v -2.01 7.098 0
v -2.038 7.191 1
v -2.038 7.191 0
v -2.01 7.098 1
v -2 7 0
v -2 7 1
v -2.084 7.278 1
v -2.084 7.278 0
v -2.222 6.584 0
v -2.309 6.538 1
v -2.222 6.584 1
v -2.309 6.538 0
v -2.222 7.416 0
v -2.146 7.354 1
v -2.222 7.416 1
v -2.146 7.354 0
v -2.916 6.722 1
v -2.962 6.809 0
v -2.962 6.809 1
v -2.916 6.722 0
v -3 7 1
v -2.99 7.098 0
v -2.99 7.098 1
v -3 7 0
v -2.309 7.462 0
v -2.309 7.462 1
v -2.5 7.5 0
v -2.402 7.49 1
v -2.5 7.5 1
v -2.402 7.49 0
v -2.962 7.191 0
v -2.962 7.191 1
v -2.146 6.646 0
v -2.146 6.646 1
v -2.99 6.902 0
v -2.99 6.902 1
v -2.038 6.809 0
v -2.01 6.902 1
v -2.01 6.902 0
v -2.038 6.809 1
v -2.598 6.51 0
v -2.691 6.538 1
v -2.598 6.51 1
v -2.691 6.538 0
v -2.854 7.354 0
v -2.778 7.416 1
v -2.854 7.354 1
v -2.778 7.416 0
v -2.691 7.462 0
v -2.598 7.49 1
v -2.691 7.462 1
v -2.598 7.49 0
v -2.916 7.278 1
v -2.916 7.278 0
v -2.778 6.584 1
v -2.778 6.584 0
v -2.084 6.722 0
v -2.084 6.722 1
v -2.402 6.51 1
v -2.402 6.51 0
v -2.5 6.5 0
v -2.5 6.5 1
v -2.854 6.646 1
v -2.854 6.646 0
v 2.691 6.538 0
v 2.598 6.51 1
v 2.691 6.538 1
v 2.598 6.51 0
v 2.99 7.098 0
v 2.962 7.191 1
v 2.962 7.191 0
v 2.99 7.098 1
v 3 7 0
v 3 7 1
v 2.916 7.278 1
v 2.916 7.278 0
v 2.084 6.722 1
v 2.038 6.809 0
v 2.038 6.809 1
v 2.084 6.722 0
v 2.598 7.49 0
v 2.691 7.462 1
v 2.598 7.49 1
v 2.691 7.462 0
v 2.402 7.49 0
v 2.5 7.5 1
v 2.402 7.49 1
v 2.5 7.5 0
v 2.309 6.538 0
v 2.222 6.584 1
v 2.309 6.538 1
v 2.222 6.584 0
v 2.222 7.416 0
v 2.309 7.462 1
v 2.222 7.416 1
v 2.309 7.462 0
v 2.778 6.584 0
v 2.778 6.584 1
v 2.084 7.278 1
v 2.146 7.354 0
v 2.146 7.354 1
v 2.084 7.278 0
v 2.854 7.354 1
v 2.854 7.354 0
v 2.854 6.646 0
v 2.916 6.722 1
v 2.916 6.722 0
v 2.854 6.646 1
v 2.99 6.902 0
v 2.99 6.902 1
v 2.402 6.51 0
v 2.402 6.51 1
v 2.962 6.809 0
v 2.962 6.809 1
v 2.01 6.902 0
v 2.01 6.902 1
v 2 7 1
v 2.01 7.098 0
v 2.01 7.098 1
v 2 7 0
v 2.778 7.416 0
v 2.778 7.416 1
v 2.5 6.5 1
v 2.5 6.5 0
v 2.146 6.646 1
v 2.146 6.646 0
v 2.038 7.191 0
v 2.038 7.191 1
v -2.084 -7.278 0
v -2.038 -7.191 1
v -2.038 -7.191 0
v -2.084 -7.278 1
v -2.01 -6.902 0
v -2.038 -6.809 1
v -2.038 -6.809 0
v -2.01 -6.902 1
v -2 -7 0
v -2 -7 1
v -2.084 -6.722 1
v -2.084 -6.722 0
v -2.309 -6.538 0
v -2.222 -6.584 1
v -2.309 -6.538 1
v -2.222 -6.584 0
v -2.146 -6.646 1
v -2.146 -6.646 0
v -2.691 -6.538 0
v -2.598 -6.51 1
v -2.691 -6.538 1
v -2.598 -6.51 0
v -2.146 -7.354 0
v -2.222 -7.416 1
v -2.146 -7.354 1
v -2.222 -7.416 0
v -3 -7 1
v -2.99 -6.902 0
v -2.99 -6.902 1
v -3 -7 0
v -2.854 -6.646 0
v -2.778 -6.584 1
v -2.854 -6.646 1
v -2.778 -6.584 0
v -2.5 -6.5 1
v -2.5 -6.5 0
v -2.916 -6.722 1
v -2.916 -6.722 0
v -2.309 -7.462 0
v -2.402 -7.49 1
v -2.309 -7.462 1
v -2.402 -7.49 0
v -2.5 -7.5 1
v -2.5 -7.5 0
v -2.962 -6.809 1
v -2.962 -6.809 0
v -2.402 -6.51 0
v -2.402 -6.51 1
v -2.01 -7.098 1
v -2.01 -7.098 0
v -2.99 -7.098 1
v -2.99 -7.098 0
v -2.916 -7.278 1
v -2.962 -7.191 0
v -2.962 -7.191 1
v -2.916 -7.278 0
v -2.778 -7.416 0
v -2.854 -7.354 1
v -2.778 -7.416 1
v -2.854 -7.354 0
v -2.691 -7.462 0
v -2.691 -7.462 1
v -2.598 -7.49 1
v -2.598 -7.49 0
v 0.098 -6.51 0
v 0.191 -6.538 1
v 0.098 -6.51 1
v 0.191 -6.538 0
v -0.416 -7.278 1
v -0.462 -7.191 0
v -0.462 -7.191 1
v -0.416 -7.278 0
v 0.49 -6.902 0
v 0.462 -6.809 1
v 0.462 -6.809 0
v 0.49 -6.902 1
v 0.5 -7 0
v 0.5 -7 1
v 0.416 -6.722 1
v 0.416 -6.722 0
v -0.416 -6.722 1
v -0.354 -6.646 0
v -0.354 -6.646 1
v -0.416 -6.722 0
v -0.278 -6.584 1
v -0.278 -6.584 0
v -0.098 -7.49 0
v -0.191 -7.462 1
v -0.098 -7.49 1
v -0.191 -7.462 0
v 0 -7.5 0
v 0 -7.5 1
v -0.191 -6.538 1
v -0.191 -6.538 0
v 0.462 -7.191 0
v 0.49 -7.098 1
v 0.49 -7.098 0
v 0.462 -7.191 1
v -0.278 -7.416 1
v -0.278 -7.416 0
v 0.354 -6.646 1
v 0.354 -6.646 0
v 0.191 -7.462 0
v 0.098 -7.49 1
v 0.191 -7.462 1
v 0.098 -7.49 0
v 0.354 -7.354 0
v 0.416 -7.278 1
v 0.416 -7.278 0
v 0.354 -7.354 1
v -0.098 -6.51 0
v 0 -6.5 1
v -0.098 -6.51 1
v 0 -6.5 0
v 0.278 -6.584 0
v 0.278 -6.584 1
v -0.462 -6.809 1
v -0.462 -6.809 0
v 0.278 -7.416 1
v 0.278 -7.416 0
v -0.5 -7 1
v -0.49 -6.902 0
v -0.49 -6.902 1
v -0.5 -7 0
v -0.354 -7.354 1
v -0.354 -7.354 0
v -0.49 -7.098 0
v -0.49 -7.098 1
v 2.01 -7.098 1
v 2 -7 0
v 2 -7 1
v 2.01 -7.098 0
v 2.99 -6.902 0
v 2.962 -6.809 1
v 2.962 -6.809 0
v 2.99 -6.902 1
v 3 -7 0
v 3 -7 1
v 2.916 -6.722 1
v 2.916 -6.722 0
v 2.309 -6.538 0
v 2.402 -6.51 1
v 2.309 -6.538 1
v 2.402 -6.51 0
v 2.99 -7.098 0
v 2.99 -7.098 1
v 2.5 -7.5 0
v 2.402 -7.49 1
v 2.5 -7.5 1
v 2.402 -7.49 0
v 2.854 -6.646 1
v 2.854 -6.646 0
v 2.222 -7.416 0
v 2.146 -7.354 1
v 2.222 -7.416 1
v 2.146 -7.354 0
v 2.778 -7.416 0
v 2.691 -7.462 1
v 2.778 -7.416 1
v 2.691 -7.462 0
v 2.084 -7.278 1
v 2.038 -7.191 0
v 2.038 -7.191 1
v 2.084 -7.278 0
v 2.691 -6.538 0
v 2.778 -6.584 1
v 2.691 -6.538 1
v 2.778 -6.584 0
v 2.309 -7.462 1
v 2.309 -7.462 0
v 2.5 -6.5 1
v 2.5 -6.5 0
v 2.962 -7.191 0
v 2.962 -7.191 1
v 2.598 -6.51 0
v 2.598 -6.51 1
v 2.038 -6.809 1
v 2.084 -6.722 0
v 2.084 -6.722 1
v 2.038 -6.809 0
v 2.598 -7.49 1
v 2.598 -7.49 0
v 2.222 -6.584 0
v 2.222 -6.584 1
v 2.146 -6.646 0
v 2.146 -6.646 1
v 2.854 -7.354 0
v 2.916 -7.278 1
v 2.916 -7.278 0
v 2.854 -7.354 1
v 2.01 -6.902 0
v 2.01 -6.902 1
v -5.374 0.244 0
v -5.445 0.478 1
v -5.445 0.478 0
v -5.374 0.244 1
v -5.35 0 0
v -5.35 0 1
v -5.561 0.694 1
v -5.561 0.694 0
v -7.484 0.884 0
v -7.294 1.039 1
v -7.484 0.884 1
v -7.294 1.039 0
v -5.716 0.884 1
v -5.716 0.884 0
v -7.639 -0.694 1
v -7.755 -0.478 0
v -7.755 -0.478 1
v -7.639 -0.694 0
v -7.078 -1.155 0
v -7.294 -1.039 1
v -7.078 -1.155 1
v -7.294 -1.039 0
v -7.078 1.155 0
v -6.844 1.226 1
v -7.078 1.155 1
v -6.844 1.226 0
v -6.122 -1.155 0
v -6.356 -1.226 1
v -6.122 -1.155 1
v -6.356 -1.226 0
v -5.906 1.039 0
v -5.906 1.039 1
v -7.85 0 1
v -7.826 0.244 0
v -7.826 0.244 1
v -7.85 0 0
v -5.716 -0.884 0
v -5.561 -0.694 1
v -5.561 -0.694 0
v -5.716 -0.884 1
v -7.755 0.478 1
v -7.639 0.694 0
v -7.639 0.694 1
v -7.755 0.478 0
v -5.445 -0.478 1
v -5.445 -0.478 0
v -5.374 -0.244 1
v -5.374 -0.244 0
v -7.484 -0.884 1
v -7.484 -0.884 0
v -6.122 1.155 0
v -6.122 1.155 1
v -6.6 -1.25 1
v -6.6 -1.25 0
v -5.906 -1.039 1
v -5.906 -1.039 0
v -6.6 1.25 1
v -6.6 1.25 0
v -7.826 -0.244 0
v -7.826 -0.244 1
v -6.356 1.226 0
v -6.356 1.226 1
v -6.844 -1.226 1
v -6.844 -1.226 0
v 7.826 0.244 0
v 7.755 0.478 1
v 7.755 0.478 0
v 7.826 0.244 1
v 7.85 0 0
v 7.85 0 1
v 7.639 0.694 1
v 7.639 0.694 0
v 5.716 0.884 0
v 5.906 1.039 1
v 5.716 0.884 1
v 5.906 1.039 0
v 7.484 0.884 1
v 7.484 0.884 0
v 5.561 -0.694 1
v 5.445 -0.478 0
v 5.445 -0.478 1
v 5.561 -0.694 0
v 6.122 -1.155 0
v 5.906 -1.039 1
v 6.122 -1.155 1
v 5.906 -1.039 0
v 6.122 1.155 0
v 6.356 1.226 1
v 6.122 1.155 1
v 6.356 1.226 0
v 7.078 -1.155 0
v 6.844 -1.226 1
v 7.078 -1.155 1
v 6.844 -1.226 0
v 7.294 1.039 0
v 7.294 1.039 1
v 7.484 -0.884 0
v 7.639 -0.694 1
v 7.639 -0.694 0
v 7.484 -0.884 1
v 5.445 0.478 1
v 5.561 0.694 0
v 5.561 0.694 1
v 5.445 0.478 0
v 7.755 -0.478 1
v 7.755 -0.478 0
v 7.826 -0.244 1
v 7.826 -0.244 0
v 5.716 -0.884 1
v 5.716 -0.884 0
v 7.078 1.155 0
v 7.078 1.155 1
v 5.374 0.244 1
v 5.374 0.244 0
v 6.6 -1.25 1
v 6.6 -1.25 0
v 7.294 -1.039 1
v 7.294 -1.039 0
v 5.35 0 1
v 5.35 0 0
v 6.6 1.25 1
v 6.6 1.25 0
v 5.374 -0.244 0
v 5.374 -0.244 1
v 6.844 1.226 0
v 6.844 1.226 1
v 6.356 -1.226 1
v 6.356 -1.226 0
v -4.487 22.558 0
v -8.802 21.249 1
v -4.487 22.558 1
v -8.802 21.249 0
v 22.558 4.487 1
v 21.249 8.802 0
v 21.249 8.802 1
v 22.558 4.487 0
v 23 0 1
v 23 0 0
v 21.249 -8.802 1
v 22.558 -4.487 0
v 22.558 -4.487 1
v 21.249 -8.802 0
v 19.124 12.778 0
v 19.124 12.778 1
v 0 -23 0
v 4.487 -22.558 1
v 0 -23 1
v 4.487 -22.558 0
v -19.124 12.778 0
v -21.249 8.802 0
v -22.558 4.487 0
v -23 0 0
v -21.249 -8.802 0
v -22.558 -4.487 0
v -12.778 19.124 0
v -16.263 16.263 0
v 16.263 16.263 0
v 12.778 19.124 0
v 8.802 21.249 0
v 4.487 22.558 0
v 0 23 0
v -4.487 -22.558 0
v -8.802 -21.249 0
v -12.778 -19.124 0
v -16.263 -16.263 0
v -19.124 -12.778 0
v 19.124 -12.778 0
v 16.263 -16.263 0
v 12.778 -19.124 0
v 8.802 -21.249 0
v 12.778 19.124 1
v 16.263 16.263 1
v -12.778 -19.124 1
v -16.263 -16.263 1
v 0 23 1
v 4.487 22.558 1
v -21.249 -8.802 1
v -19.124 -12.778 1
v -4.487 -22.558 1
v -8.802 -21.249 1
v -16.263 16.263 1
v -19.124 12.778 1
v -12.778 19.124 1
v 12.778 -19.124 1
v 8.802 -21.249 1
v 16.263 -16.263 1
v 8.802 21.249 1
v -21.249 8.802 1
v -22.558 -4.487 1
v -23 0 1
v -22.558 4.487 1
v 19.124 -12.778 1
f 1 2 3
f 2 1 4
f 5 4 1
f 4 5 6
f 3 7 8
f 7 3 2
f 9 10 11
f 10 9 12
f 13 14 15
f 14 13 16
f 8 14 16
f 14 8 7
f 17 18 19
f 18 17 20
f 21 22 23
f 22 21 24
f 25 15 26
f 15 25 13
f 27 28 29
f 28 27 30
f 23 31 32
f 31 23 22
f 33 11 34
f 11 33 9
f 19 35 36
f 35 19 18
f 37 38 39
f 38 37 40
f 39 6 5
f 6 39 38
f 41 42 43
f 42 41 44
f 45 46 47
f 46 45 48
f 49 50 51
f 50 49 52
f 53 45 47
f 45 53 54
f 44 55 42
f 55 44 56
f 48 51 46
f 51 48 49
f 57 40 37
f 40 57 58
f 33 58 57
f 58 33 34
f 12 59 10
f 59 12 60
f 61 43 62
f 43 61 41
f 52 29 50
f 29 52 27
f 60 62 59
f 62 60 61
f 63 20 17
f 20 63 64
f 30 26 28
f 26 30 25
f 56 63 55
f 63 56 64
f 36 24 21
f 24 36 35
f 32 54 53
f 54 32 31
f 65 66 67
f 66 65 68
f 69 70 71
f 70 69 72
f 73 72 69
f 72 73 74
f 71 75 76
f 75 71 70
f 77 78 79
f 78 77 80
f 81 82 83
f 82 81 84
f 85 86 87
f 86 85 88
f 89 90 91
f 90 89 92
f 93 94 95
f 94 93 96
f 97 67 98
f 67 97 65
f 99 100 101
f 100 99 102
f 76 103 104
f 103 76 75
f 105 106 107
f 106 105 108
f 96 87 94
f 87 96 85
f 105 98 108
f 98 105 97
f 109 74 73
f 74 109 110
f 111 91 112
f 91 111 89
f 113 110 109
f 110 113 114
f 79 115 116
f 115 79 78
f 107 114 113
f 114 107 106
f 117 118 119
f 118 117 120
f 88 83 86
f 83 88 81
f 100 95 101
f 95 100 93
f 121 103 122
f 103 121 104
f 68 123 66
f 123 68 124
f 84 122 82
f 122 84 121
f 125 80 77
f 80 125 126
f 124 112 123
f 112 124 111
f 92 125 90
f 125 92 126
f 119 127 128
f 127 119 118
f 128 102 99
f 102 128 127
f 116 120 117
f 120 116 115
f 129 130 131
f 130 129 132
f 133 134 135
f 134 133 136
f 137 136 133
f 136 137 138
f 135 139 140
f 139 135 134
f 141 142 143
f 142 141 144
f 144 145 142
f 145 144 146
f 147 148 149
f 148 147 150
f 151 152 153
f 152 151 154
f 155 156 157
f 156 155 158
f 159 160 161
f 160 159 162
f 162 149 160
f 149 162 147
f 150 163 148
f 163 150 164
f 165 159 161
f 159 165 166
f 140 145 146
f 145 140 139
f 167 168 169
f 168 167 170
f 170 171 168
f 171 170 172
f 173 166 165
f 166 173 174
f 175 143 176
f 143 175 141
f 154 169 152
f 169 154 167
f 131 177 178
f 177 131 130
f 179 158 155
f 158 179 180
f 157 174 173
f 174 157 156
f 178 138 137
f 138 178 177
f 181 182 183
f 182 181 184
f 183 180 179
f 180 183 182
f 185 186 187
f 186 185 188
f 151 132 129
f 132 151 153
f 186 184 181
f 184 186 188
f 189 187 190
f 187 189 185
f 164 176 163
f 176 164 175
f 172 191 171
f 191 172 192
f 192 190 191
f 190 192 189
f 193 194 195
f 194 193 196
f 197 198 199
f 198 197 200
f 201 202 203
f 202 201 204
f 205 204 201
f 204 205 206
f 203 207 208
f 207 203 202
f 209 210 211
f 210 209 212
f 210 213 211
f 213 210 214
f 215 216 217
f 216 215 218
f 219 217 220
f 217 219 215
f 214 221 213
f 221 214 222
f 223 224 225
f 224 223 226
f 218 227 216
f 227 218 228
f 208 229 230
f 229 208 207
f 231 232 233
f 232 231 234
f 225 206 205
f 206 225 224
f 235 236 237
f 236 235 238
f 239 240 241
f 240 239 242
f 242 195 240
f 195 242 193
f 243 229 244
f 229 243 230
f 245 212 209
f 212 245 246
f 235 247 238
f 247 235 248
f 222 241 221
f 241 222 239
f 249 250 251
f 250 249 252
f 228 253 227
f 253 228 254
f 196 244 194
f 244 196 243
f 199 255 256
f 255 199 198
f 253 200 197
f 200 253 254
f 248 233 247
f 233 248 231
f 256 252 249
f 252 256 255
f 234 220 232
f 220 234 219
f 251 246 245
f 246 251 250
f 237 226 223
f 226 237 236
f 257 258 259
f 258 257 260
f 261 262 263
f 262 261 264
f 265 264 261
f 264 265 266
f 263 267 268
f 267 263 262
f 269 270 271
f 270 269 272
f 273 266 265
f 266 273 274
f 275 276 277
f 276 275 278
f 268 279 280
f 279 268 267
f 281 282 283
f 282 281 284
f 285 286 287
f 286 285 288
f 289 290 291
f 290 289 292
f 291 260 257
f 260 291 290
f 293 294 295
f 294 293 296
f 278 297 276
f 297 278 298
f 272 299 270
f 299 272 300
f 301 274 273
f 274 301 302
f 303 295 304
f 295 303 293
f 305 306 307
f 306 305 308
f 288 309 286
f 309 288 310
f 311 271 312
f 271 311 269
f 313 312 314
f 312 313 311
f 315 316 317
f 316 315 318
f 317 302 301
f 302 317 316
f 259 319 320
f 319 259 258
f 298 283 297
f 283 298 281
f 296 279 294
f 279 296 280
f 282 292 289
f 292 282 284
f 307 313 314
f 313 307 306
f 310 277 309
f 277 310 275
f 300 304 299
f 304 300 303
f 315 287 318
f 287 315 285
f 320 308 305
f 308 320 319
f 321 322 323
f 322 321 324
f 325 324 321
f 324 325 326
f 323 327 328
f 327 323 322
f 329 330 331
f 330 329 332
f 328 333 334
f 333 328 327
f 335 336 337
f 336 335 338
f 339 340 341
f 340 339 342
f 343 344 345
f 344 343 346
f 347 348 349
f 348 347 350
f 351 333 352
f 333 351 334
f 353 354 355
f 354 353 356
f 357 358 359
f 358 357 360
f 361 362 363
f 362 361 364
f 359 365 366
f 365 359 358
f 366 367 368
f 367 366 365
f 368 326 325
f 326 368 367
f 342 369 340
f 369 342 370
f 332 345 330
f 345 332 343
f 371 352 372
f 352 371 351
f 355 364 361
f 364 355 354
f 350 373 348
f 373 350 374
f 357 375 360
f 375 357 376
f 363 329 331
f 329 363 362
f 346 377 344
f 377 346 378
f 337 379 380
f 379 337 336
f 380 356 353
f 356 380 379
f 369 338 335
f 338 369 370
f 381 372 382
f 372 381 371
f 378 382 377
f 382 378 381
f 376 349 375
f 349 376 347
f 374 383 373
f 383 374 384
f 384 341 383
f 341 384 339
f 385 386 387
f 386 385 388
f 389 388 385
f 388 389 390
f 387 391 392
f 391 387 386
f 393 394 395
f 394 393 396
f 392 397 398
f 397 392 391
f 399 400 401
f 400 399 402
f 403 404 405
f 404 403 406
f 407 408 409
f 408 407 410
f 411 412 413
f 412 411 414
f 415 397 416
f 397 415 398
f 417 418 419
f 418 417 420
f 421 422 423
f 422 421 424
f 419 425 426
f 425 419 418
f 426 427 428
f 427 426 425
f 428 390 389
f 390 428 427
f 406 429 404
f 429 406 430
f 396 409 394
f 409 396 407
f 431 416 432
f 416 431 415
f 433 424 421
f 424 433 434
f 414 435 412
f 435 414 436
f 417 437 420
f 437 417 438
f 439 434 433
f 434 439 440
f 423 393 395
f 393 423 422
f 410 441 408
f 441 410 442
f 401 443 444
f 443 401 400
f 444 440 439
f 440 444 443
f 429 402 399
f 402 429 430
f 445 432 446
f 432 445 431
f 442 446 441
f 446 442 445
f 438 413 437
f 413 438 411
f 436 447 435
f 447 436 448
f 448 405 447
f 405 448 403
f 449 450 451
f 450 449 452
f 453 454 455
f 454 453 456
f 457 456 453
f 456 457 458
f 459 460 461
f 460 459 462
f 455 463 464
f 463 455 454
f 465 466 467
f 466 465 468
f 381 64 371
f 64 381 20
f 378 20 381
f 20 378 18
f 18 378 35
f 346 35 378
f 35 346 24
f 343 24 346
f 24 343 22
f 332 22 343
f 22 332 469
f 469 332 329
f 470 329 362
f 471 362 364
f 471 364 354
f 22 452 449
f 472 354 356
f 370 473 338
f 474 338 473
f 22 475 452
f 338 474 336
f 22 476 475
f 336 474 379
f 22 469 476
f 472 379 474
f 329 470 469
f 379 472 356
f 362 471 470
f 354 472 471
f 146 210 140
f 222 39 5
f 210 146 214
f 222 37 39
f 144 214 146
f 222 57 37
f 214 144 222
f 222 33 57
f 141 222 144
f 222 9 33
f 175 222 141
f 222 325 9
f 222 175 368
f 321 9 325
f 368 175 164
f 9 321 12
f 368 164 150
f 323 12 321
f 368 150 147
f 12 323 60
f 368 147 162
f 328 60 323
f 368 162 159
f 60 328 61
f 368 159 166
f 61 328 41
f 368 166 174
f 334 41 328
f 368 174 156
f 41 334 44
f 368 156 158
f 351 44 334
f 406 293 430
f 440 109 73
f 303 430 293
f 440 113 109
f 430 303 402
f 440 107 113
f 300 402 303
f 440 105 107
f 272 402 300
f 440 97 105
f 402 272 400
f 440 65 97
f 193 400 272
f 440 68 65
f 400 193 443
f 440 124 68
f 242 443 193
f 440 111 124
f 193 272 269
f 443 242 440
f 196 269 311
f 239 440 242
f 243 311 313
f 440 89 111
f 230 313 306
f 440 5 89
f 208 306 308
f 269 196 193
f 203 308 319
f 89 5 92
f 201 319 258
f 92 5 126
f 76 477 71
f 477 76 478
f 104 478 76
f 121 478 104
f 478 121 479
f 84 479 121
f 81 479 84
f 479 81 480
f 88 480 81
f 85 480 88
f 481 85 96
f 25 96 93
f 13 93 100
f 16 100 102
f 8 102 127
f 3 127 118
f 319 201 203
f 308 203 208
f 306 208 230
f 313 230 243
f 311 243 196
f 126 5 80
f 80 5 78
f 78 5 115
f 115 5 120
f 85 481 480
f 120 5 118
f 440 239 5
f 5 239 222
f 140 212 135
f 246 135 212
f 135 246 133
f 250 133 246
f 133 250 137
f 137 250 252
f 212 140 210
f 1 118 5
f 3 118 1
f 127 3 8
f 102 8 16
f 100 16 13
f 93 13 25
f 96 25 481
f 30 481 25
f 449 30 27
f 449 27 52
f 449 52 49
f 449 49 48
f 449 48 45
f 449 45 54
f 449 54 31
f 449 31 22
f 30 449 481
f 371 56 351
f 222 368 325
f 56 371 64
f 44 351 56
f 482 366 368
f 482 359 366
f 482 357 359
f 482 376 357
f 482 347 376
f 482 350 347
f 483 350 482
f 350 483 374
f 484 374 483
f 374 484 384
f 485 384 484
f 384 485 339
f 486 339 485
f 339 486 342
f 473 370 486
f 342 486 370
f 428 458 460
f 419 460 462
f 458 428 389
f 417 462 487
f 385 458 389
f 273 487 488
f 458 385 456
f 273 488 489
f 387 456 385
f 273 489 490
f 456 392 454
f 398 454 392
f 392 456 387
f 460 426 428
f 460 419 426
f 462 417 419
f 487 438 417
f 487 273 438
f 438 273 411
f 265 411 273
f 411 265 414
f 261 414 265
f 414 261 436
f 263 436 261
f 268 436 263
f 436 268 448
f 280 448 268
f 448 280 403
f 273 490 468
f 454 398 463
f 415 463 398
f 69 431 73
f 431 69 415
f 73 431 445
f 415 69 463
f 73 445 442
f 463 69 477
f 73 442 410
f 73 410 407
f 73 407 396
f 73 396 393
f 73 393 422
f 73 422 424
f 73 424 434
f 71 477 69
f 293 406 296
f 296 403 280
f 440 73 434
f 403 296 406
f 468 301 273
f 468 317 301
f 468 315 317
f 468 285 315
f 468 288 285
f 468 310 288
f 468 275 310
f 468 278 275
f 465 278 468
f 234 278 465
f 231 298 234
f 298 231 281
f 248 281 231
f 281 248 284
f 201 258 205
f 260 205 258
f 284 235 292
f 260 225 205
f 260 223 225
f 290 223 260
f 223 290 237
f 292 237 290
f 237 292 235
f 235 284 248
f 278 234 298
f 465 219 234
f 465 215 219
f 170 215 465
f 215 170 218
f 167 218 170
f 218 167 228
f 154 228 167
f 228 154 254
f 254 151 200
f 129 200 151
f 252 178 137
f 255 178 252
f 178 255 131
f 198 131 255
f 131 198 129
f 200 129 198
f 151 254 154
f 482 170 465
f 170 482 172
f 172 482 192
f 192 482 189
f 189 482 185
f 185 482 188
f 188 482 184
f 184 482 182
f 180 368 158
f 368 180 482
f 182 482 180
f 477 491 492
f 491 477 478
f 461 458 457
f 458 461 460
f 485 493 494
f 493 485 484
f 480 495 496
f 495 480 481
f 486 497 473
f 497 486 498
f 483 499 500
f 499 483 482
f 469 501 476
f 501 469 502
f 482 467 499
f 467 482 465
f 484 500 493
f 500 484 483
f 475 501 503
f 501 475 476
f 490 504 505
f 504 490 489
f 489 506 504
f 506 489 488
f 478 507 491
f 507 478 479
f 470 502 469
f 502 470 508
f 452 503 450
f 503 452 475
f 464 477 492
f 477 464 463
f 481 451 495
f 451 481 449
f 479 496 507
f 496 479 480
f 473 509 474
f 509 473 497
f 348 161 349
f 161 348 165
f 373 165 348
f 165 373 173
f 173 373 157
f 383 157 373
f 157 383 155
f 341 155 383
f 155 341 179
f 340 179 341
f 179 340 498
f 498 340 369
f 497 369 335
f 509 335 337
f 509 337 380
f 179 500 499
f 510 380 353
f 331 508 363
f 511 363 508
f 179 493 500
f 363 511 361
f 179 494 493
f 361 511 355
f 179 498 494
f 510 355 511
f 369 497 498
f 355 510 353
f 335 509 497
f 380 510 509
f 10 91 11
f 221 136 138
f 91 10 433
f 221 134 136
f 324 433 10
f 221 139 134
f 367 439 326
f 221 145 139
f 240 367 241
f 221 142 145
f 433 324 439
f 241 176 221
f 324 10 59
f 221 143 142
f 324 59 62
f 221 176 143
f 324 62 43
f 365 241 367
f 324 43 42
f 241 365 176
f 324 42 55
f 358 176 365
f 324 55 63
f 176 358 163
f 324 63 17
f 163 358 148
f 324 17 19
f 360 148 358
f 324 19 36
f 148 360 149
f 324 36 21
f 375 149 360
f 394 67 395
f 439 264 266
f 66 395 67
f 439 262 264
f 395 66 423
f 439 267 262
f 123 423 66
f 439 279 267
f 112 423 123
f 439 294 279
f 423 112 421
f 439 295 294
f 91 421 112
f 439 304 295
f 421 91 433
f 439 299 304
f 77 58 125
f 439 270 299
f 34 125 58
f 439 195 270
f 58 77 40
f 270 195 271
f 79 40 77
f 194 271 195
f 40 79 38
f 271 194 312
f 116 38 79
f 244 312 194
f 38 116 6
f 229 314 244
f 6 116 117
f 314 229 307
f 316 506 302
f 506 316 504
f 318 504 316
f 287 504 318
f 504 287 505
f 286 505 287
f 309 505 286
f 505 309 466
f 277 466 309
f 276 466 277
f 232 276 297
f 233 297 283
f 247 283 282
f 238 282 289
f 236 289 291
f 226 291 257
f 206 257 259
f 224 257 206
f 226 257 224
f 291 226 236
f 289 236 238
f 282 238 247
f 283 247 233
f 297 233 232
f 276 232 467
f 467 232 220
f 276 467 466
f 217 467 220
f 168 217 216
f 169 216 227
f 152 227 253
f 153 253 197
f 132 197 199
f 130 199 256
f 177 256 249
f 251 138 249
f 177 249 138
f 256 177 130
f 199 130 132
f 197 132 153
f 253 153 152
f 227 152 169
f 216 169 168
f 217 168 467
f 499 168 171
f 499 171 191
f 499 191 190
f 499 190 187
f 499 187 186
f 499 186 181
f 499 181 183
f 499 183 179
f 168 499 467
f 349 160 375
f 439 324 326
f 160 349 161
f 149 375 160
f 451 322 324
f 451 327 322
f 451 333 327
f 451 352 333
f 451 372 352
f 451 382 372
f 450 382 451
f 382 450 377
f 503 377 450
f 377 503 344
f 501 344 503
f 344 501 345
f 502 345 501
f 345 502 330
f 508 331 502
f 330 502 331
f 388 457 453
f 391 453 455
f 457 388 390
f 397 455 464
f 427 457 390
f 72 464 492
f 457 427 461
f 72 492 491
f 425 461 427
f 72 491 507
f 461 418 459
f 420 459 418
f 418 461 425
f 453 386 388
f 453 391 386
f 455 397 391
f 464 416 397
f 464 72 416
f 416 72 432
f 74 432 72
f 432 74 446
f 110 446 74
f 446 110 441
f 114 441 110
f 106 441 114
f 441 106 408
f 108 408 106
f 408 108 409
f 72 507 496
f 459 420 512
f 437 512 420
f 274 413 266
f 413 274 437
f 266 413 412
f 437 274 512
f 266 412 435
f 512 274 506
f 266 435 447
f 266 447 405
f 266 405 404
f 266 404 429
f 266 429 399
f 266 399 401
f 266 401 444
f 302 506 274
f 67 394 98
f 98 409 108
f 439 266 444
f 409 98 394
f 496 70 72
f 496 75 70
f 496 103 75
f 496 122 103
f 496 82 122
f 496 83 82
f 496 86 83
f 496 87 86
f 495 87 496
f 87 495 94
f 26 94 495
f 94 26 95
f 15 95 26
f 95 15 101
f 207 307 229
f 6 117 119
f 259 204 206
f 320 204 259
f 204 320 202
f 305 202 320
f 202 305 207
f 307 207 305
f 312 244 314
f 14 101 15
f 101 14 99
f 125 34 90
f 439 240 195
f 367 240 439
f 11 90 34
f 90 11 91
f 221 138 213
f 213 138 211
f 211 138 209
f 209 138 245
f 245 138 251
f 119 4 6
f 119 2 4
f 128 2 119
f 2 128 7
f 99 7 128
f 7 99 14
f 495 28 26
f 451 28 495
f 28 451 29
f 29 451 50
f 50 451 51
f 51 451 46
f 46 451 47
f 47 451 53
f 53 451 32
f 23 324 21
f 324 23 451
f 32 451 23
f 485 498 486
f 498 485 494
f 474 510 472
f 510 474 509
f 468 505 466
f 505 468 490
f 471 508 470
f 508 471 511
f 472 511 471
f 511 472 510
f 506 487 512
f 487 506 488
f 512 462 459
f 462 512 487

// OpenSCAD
// file: parts.scad
/**
 * Martin Egli
 * 2023-08-29
 */

// PEC12R-2220F-S0024
module pec12r_pcbcut(hi1 = 3, loc_res = 32) {
    // 1
    translate([-2.5, 7, 0])
    cylinder(d = 1, h = hi1, $fn = loc_res);
    // 2
    translate([+2.5, 7, 0])
    cylinder(d = 1, h = hi1, $fn = loc_res);
    // A
    translate([-2.5, -7, 0])
    cylinder(d = 1, h = hi1, $fn = loc_res);
    // B
    translate([0, -7, 0])
    cylinder(d = 1, h = hi1, $fn = loc_res);
    // C
    translate([+2.5, -7, 0])
    cylinder(d = 1, h = hi1, $fn = loc_res);
    // case shield
    translate([-13.2/2, 0, 0])
    cylinder(d = 2.5, h = hi1, $fn = loc_res);
    // case shield
    translate([+13.2/2, 0, 0])
    cylinder(d = 2.5, h = hi1, $fn = loc_res);
}
module pec12r(show_cutout = 1, loc_res = 32) {
    if(show_cutout) {
        translate([0, 0, -2])
        pec12r_pcbcut(hi1 = 2);
    }
    color("DarkGray")
    translate([-12.4/2, -13.4/2, 0])
    cube([12.4, 13.4, 6.0]);
    color("LightGray")
    translate([-12.4/2, -13.4/2, 6.0])
    cube([12.4, 13.4, 0.1]);
    color("DarkGray")
    translate([0, 0, 6.0])
    cylinder(d = 7, h = 2, $fn = loc_res);
    color("DarkGray")
    translate([0, 0, 0])
    cylinder(d = 6, h = 15, $fn = loc_res);
}

module en12hs_cutout(hi1 = 3, loc_res = 32) {
    pec12r_pcbcut(hi1, loc_res);
}

// EN12-HS11AF18
module en12hs(show_cutout = 1, loc_res = 32) {
    if(show_cutout) {
        translate([0, 0, -2])
        en12hs_cutout(hi1 = 2);
    }
    color("LightGreen")
    translate([-12.4/2, -13.4/2, 0])
    cube([12.4, 13.4, 5.9]);
    color("LightGray")
    translate([-12.4/2, -13.4/2, 5.9])
    cube([12.4, 13.4, 0.1]);
    color("LightGray")
    translate([0, 0, 6.0])
    cylinder(d = 7, h = 5, $fn = loc_res);
    color("DarkGray")
    difference() {
        hull() {
            translate([0, 0, 0])
            cylinder(d = 6, h = 17.5, $fn = loc_res);
            translate([0, 0, 0])
            cylinder(d = 5.5, h = 18, $fn = loc_res);
        }
        translate([1.5, -3, 18-5])
        cube([6, 6, 6]);
    }
}
en12hs();

module led0505(loc_res = 32) {
    difference() {
        union() {
            color("White")
            translate([-5/2, -5/2, 0])
            cube([5, 5, 1.6]);
            color("Gray")
            translate([0, 0, 1.5])
            cylinder(d = 4, h = 0.2, $fn = loc_res);
        }
        translate([5/2, -5/2-1.5, 1.6-0.2])
        rotate([0, 0, 45])
        cube([2, 2, 0.3]);
    }
}

module ledWS2812B(loc_res = 32) {
    led0505(loc_res);
}

module ledSK6812(loc_res = 32) {
    led0505(loc_res);
}
// main file
/**
 * Martin Egli
 * 2023-08-29
 */
use <parts.scad>

// - pcbs, electronics ------------------------------------

// lower pcb, holding LEDs
module pcb01(show_components = 1, pcb_th = 1, loc_res = 32) {
    color("Green") {
        difference() {
            translate([0, 0, 0])
            cylinder(d = 46, h = pcb_th, $fn = loc_res);
            translate([0, 0, -1])
            cylinder(d = 7.5, h = pcb_th+2, $fn = loc_res);
        }
    }
    if(show_components) {
        nb_steps = 9;
        for(n = [0:1:nb_steps-1]) {
            translate([20*cos(n*360/nb_steps), 20*sin(n*360/nb_steps), 0])
            rotate([180, 0, n*360/nb_steps])
            ledSK6812();
        }
    }
}

/** middle pcb, holding 
 *  + buttons, sensorschalter
 *  + usb connector
 *  + MCU
 *  + battery
 */
module pcb02(show_components = 1, pcb_th = 1, loc_res = 32) {
    color("Green") {
        difference() {
            translate([0, 0, 0])
            cylinder(d = 46, h = pcb_th, $fn = loc_res);
            translate([0, 0, -1])
            en12hs_cutout(4);
        }
    }
    if(show_components) {
        // taster
        translate([18, -5/2, -5])
        cube([5, 5, 5]);
    }
}

// - 3d printing ---------------------------------
module partA_bottom(loc_res = 32, outer_res = 16) {
    difference() {
        union() {
            // middle mounting hole
            translate([0, 0, 1])
            difference() {
                translate([0, 0, -1])
                cylinder(d = 9, h = 4, $fn = loc_res);
                // middle cut out
                difference() {
                    translate([0, 0, -2])
                    cylinder(d = 6.4, h = 6, $fn = loc_res);
                    translate([1.5, -3, -3])
                    cube([6, 6, 8]);
                }
            }
            difference() {
                hull() {
                    translate([0, 0, -1])
                    cylinder(d = 48, h = 1, $fn = outer_res);
                    translate([0, 0, 0])
                    cylinder(d = 50, h = 6, $fn = outer_res);
                }
                translate([0, 0, 1])
                hull() {
                    translate([0, 0, -1])
                    cylinder(d = 48-2, h = 1, $fn = loc_res);
                    translate([0, 0, 0])
                    cylinder(d = 50-2, h = 6, $fn = loc_res);
                }
            }
        }
        // look inside
        *translate([0, 0, -10])
        cube(40);
    }
}

module partB_top(loc_res = 32, outer_res = 16) {
    difference() {
        // hull
        union() {
            difference() {
                hull() {
                    translate([0, 0, 1])
                    cylinder(d = 45, h = 1, $fn = outer_res);
                    translate([0, 0, -11.5])
                    cylinder(d = 50, h = 12.5, $fn = outer_res);
                }
                translate([0, 0, -1])
                hull() {
                    translate([0, 0, 1])
                    cylinder(d = 48-2, h = 1, $fn = outer_res);
                    translate([0, 0, -11.5])
                    cylinder(d = 50-2, h = 12.5, $fn = outer_res);
                }
            }
        }
        // display hole, from oled1_28ZollRound --> 32.5 mm hole
        translate([0, 0, 0])
        cylinder(d = 32.5, h = 3, $fn = loc_res);
        
        // usb connector
        hull() {
            translate([23, -2, -(10+1.5/2)])
            rotate([0, 90, 0])
            cylinder(d = 1.5, h = 4, $fn = loc_res);
            translate([23, 2, -(10+1.5/2)])
            rotate([0, 90, 0])
            cylinder(d = 1.5, h = 4, $fn = loc_res);
            translate([23, -2, -(10+1.5/2)-2])
            rotate([0, 90, 0])
            cylinder(d = 1.5, h = 4, $fn = loc_res);
            translate([23, 2, -(10+1.5/2)-2])
            rotate([0, 90, 0])
            cylinder(d = 1.5, h = 4, $fn = loc_res);
        }
        // look inside
        *translate([0, 0, -20])
        cube(40);
    }
}

module puttogether(loc_res = 32) {
    rotate([180, 0, 0])
    en12hs(0);
    translate([0, 0, -(6+7)])
    pcb01(0);
    translate([0, 0, 0])
    pcb02(0);
    
    translate([0, 0, -18])
    partA_bottom();
    
    translate([0, 0, 0])
    partB_top();
}

**puttogether();

// printing
*partA_bottom(64);
*partB_top(64);
*pcb01(0);
pcb02(0);
